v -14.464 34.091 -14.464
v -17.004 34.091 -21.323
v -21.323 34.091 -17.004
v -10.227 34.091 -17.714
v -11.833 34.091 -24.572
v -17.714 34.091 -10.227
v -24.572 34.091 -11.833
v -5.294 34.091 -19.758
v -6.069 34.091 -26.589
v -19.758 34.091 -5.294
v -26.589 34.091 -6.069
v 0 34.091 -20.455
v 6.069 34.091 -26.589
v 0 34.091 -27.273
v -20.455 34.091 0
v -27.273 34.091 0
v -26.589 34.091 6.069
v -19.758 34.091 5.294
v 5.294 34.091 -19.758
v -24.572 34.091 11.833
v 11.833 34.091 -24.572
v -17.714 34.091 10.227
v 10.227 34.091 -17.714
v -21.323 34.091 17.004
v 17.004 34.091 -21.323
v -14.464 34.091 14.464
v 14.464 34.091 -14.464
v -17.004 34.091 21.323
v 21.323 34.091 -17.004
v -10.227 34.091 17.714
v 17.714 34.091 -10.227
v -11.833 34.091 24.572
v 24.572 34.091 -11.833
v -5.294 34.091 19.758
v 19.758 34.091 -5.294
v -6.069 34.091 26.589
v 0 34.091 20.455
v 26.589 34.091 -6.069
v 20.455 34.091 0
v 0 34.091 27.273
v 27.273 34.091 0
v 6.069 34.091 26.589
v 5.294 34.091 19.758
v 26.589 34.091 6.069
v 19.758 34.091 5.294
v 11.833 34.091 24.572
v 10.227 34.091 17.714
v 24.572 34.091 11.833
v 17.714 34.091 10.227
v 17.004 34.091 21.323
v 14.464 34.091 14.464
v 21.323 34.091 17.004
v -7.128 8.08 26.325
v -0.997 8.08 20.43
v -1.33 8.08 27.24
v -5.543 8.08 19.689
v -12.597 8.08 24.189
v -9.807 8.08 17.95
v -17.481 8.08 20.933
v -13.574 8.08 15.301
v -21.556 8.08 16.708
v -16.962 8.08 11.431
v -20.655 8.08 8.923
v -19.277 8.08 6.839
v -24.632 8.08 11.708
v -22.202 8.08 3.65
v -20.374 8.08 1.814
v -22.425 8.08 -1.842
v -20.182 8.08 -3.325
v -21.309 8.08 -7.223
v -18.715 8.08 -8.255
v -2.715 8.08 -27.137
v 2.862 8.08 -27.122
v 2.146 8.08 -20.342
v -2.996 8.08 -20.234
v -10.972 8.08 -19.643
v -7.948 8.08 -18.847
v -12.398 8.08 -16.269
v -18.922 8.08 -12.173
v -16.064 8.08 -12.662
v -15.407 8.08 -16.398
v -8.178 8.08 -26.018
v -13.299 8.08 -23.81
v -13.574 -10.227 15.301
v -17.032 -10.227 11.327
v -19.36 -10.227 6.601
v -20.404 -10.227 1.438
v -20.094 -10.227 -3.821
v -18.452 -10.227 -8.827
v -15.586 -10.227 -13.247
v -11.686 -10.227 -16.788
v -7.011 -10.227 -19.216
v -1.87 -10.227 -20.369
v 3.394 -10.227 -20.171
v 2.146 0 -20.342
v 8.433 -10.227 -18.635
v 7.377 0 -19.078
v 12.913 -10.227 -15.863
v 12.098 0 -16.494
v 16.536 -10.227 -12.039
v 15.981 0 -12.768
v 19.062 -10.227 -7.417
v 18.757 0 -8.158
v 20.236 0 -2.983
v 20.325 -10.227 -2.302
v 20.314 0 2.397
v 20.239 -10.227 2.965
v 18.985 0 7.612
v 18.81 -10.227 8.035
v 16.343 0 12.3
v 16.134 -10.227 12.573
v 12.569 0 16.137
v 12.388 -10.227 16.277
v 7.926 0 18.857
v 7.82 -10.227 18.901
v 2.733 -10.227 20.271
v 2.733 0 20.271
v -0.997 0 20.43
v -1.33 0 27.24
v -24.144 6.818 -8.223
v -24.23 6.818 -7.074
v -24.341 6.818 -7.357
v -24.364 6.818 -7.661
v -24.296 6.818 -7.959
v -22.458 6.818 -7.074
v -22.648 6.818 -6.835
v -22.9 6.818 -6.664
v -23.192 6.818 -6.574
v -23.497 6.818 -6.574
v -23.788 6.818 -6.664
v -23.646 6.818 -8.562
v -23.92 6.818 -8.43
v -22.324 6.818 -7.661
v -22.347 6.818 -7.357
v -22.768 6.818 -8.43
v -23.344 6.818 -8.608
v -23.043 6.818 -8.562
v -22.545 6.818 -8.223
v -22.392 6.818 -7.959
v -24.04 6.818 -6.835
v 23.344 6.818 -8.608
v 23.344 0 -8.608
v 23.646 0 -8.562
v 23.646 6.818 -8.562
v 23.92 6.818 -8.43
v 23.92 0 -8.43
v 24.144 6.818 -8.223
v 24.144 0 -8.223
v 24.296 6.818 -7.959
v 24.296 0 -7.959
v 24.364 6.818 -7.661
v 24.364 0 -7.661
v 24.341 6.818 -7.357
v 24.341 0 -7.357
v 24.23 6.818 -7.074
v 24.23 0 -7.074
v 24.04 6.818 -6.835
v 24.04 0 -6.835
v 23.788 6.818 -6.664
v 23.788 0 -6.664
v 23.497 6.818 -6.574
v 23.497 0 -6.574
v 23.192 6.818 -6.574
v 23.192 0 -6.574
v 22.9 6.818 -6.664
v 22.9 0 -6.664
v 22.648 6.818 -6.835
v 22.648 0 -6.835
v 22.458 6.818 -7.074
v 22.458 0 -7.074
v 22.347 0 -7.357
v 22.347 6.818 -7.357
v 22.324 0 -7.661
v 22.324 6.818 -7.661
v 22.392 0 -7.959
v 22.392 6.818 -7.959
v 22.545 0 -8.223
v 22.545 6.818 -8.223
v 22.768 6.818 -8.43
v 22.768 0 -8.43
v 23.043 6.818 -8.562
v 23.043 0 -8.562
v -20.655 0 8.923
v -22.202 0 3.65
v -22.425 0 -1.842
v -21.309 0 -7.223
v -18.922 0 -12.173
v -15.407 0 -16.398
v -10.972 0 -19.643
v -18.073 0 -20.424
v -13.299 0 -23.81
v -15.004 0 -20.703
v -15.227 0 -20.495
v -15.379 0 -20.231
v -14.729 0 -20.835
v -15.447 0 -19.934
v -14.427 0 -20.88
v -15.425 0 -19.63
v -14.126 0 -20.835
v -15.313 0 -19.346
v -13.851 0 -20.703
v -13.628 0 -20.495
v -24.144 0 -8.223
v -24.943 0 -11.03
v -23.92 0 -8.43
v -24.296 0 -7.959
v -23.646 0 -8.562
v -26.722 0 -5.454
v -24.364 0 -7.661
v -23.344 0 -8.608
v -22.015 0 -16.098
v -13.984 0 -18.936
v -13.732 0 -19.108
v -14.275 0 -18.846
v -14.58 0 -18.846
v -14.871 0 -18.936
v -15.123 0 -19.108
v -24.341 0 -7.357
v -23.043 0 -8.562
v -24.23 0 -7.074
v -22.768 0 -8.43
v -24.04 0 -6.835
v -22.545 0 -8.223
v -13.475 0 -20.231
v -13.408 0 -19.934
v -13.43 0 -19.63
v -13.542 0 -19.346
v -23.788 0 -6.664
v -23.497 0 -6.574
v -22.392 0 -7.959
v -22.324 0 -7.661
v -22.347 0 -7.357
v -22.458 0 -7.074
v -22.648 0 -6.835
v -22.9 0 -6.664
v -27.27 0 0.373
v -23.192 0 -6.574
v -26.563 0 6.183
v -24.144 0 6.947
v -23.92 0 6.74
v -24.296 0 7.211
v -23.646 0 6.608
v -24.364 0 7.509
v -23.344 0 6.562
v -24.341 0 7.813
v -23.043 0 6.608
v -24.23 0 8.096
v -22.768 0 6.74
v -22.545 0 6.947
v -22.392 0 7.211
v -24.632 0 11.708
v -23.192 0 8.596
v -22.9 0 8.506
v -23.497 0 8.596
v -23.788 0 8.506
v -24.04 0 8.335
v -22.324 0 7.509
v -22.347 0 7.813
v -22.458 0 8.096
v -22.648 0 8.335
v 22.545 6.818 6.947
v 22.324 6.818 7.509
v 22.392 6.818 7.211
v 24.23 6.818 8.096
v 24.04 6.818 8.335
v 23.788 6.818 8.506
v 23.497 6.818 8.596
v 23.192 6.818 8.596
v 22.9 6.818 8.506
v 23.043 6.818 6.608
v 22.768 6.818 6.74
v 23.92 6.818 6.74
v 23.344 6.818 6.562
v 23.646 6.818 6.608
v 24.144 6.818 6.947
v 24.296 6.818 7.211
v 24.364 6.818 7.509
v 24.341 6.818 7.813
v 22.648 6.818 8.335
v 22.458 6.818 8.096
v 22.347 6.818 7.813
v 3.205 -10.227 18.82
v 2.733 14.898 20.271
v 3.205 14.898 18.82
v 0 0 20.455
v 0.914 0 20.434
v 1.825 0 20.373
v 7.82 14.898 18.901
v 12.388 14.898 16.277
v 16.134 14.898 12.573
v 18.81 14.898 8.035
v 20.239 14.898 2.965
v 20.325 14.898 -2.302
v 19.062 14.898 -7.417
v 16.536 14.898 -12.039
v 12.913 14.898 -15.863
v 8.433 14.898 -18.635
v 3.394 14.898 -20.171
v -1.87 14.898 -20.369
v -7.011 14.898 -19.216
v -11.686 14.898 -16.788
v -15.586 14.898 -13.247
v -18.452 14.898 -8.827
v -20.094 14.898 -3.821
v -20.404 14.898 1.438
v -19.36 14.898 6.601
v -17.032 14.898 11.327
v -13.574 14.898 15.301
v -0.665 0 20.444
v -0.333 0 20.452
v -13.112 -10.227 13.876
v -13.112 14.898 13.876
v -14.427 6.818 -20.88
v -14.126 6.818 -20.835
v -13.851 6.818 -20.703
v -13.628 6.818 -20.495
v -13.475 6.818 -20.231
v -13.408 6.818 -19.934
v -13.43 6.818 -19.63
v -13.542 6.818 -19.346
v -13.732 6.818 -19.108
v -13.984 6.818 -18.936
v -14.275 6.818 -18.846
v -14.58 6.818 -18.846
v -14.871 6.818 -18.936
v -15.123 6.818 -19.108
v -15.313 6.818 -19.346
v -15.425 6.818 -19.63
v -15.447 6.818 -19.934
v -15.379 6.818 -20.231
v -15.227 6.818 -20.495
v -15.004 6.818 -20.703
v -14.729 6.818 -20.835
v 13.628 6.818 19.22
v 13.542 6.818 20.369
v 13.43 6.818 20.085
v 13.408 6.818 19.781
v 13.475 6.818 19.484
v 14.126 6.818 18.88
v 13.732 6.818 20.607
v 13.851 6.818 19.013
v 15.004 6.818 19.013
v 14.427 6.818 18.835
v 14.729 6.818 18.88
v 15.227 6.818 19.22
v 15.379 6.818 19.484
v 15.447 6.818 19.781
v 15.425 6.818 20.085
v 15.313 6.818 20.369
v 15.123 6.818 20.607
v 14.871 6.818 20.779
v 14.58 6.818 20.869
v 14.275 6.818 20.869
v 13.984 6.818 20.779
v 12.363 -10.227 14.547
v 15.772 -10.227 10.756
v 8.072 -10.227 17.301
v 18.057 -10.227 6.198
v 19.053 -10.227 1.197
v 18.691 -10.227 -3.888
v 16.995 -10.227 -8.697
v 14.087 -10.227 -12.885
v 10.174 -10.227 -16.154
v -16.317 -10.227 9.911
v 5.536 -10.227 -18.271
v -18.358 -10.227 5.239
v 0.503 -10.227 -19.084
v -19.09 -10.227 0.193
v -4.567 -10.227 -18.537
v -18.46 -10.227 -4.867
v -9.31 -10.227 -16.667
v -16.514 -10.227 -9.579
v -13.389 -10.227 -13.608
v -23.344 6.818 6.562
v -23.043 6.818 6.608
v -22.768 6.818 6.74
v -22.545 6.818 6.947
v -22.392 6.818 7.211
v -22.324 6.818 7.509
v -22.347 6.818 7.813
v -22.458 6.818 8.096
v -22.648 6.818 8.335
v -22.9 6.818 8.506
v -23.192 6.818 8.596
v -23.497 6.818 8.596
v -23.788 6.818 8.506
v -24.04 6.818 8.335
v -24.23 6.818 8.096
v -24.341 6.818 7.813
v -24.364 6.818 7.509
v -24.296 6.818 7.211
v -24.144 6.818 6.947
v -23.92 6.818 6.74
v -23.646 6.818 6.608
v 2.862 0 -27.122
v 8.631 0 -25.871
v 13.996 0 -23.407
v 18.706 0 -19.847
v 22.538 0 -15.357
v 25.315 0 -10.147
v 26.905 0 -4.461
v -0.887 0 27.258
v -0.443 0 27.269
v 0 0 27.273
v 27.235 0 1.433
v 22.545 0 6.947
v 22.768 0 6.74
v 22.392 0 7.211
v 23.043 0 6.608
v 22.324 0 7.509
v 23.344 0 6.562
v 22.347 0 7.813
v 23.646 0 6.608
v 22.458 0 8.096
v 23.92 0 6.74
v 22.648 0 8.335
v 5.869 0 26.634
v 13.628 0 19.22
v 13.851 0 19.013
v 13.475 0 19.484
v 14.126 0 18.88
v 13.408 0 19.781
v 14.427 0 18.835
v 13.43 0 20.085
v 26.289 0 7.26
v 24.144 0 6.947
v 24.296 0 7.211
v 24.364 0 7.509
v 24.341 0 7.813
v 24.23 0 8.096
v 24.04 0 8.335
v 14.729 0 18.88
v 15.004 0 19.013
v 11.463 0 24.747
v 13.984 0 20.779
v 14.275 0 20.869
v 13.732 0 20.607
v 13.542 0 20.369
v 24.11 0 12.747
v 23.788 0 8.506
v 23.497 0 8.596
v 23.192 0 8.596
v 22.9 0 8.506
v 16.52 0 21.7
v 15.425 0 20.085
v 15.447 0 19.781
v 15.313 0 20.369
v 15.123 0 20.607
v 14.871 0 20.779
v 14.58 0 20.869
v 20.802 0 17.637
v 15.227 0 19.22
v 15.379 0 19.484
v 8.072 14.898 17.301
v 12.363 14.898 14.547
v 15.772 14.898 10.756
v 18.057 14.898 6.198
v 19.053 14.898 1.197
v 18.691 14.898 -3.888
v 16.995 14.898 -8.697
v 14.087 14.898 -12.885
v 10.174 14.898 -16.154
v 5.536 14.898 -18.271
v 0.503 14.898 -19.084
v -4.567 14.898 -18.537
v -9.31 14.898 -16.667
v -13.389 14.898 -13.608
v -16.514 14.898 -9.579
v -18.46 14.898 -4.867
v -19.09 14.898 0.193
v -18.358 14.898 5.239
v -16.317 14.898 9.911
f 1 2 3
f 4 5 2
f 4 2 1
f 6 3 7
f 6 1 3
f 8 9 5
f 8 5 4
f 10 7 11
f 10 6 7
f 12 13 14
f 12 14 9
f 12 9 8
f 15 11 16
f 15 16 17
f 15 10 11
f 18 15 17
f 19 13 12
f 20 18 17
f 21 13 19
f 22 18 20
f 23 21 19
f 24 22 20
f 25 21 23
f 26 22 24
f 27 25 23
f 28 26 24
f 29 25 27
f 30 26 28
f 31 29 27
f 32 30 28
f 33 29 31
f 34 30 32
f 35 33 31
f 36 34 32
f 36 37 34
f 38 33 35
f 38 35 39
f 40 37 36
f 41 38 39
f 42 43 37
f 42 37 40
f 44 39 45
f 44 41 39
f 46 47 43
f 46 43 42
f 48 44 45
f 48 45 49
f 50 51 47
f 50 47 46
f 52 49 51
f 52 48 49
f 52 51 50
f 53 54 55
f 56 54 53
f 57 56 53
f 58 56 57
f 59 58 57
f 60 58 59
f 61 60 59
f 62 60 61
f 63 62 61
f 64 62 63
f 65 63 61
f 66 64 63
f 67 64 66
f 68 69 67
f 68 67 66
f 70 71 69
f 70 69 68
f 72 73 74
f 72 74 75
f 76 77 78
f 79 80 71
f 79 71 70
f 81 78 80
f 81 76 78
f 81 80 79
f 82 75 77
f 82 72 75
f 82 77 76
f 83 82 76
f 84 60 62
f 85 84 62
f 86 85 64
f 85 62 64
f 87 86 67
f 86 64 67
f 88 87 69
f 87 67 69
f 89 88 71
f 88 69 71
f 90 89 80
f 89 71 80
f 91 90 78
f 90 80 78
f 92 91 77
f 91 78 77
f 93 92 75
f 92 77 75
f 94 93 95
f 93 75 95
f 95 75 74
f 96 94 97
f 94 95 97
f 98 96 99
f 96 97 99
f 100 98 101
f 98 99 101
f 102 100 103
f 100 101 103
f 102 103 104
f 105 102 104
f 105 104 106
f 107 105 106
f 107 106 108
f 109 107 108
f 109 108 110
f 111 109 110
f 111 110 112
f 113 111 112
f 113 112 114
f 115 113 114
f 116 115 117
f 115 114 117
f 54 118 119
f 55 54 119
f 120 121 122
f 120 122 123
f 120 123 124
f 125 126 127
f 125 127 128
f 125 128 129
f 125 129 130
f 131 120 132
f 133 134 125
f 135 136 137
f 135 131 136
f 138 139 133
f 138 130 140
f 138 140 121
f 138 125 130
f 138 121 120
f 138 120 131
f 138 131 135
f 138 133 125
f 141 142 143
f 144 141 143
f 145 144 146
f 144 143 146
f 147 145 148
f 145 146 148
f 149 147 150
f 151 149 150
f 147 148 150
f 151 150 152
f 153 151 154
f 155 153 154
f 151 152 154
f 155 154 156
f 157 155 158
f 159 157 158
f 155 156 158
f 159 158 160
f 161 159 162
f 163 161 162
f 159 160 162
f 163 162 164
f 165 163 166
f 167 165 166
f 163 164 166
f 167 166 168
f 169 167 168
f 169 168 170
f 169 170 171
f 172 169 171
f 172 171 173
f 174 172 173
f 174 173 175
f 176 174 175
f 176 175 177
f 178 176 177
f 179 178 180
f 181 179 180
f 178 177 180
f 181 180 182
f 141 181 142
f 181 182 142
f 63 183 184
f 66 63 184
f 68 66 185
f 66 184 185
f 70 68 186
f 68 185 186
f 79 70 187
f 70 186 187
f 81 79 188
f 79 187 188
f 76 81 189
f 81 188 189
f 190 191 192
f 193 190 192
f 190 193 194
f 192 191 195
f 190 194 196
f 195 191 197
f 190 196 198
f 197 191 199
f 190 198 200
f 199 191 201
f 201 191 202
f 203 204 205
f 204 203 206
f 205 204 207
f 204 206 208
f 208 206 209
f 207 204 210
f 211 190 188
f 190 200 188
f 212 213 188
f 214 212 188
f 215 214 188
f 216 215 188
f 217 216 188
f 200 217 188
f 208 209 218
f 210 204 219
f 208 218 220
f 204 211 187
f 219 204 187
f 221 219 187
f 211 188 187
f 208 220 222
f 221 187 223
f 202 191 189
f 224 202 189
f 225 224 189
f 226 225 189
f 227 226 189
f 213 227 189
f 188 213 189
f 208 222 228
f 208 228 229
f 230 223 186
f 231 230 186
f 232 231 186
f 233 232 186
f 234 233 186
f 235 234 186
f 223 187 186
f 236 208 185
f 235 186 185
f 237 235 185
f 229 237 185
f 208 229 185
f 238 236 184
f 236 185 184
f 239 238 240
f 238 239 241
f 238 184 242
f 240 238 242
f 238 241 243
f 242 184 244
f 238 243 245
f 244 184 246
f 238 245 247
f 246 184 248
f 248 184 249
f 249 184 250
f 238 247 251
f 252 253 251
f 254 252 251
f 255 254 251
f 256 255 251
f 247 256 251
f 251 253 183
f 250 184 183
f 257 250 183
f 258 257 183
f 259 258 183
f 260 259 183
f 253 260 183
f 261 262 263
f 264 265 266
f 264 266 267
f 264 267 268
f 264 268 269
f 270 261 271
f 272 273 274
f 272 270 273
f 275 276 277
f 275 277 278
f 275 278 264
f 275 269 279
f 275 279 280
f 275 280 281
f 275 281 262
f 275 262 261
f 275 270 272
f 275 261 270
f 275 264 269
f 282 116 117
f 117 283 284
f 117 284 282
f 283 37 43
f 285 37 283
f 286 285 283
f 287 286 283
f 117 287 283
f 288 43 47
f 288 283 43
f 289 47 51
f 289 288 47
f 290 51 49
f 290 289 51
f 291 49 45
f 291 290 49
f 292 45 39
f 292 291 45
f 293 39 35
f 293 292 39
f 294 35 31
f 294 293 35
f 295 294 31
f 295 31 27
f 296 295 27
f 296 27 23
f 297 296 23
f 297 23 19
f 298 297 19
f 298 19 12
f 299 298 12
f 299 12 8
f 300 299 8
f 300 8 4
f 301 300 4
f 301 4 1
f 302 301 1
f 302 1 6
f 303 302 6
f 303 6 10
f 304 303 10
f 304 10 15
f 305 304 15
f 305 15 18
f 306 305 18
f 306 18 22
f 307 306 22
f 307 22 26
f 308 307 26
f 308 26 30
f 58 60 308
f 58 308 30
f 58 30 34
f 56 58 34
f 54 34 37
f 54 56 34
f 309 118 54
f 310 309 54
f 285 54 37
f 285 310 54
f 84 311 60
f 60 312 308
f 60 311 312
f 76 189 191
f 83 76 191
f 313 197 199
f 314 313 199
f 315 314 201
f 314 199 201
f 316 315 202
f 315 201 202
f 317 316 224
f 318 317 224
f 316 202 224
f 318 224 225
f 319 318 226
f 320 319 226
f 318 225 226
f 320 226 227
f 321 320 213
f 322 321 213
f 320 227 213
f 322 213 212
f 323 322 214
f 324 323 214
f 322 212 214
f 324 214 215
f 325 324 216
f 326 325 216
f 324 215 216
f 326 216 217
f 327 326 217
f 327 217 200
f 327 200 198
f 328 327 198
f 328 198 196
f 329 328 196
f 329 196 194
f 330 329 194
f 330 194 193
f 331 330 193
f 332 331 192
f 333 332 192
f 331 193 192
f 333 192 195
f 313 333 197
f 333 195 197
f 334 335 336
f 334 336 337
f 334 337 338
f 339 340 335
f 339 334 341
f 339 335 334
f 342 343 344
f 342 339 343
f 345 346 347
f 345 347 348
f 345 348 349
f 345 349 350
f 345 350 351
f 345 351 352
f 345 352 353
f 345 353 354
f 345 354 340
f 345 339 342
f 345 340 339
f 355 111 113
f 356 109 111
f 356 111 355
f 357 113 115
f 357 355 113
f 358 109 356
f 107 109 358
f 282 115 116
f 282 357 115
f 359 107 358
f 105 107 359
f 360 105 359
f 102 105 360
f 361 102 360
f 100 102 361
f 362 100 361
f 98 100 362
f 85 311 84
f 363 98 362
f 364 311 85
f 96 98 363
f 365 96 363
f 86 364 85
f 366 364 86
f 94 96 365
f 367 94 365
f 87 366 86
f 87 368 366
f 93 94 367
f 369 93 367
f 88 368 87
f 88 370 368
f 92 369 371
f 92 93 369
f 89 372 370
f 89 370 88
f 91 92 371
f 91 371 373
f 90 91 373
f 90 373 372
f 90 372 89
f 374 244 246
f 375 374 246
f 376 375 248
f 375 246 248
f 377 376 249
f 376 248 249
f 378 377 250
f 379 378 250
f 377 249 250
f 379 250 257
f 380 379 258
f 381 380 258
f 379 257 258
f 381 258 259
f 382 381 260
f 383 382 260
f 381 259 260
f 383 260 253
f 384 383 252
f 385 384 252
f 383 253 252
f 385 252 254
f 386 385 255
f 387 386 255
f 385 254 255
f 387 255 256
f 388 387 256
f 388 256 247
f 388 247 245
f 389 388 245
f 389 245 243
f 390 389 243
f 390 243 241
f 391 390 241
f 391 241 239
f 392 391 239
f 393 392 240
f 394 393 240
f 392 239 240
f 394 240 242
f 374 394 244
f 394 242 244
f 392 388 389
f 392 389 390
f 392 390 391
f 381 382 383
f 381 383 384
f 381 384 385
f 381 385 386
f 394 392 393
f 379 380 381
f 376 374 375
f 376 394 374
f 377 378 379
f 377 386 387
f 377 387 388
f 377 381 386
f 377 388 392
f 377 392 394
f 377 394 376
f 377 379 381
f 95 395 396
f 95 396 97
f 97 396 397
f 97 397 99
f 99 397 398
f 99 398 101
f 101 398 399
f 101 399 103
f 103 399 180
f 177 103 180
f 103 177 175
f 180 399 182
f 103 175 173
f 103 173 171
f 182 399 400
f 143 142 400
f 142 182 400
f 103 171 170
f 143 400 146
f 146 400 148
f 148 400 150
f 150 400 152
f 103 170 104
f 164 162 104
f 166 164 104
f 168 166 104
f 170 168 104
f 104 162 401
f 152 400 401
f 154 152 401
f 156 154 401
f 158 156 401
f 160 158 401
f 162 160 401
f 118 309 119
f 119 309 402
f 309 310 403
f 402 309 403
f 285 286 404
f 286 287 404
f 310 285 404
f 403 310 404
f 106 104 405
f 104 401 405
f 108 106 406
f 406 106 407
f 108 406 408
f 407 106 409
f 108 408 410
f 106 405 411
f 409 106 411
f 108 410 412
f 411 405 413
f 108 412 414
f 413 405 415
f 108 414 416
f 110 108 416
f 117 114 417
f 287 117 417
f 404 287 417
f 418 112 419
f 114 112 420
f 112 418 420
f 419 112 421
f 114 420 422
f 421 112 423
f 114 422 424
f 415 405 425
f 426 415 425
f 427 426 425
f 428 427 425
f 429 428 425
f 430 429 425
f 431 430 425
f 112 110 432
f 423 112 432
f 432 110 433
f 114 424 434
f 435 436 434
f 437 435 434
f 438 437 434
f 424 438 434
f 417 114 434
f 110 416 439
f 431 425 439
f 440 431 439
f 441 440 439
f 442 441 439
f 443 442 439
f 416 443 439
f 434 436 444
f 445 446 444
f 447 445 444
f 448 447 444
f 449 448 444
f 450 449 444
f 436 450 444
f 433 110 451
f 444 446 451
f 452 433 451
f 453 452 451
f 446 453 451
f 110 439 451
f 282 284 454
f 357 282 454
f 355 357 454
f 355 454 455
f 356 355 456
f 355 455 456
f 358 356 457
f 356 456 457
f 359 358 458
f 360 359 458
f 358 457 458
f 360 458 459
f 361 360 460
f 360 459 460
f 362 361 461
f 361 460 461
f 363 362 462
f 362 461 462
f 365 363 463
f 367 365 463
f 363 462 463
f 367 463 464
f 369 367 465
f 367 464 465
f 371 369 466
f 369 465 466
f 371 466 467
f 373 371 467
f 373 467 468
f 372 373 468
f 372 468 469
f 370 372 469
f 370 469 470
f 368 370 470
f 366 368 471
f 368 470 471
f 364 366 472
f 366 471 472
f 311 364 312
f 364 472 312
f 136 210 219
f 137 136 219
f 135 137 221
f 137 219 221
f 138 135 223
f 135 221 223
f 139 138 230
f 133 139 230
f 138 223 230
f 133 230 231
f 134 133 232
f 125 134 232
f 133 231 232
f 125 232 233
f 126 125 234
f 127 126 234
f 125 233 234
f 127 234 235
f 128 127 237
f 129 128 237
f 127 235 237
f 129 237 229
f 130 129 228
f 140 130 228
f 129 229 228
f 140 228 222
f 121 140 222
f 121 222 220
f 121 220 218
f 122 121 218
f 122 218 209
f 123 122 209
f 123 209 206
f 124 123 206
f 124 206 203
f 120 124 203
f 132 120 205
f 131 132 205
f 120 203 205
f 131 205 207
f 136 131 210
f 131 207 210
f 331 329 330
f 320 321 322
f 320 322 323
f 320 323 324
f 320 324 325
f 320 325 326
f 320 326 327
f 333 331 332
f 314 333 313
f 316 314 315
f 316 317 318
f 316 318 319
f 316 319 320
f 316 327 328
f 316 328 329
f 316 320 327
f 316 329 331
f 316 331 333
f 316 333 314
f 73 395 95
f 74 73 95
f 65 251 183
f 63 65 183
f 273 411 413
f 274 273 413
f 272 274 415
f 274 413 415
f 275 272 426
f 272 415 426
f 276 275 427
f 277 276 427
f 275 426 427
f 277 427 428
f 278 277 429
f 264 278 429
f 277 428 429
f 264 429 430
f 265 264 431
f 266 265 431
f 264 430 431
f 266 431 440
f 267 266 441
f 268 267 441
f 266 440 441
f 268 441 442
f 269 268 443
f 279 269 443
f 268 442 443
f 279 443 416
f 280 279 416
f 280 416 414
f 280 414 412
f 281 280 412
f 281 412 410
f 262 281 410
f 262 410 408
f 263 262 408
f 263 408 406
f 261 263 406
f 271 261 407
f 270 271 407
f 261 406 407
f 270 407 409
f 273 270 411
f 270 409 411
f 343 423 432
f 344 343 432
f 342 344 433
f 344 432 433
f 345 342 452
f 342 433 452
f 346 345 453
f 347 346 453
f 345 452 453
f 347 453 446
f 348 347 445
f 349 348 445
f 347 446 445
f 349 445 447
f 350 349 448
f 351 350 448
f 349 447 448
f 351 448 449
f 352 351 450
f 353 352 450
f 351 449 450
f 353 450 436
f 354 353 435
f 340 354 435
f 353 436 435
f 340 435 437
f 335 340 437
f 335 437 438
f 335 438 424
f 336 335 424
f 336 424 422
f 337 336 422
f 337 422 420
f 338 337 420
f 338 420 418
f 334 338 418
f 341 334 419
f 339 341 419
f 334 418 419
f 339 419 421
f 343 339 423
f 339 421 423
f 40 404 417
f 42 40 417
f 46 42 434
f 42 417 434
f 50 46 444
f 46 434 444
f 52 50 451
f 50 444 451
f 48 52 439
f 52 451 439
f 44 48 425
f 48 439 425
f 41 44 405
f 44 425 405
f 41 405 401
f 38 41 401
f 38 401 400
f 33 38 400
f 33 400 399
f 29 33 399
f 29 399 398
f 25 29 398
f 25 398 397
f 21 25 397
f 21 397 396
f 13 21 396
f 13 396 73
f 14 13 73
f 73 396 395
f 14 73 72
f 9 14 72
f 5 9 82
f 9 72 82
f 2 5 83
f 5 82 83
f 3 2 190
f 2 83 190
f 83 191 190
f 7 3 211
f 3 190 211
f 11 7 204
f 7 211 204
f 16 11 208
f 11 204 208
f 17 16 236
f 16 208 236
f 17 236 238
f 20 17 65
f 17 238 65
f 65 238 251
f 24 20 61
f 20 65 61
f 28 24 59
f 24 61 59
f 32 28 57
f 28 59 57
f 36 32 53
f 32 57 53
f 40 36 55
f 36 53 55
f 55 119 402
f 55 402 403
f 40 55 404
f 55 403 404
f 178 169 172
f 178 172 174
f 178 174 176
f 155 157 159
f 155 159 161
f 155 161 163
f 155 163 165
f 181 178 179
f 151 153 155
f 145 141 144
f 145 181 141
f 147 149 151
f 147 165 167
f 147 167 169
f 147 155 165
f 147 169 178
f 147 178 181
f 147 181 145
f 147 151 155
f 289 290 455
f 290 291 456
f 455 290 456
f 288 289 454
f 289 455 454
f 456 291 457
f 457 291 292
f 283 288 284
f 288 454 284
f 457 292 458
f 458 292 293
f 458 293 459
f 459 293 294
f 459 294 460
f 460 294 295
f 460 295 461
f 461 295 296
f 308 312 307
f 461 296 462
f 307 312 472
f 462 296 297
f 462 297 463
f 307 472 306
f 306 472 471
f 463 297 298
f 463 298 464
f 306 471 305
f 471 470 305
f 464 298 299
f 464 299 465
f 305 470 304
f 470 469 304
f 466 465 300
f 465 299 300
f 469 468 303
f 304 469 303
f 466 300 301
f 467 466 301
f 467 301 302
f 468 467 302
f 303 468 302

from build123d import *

# Parameters (mm, degrees)
ESBO_O1_R                     = 40
ESBO_O1_R_2                   = 30
RESSALTO_EXTRUS_O1_DEPTH      = 50
ESBO_O2_R                     = 1.5
CORTE_EXTRUS_O1_DEPTH         = 10
CORTE_EXTRUS_O2_DEPTH         = 11.84997677
RESSALTO_EXTRUS_O2_DEPTH      = 26.84997677
RESSALTO_EXTRUS_O2_DEPTH_BACK = 10
ESCALA1_SCALE                 = 0.681818182


with BuildPart() as part:
    # Esboço1 → Ressalto-extrusão1 (new body)
    with BuildSketch(Plane(origin=(0, 0, 0), x_dir=(1, 0, 0), z_dir=(0, 1, 0))):
        with Locations(Location((0, 0, 0), (0, 0, 270))):
            Circle(ESBO_O1_R)
        with Locations(Location((0, 0, 0), (0, 0, 270))):
            Circle(ESBO_O1_R_2, mode=Mode.SUBTRACT)
    extrude(amount=RESSALTO_EXTRUS_O1_DEPTH)

    # Esboço2 → Corte-extrusão1 (cut)
    with BuildSketch(Plane(origin=(0, 0, 0), x_dir=(-1, 0, 0), z_dir=(0, -1, 0))):
        with Locations(Location((-21.160269083, -29.124611797, 0), (0, 0, 90))):
            Circle(ESBO_O2_R)
        with Locations(Location((-34.238034587, -11.124611797, 0), (0, 0, 90))):
            Circle(ESBO_O2_R)
        with Locations(Location((-34.238034587, 11.124611797, 0), (0, 0, 90))):
            Circle(ESBO_O2_R)
        with Locations(Location((21.160269083, 29.124611797, 0), (0, 0, 90))):
            Circle(ESBO_O2_R)
        with Locations(Location((34.238034587, 11.124611797, 0), (0, 0, 90))):
            Circle(ESBO_O2_R)
        with Locations(Location((34.238034587, -11.124611797, 0), (0, 0, 90))):
            Circle(ESBO_O2_R)
    extrude(amount=-CORTE_EXTRUS_O1_DEPTH, mode=Mode.SUBTRACT)

    # Esboço3 → Corte-extrusão2 (cut)
    with BuildSketch(Plane(origin=(0, 0, 0), x_dir=(-1, 0, 0), z_dir=(0, -1, 0))):
        with BuildLine():
            ThreePointArc((30.293924668, -13.087327008), (31.253408489, 10.593604572), (16.092357529, 28.81034587))
            Line((16.092357529, 28.81034587), (19.505887914, 34.921631358))
            ThreePointArc((19.505887914, 34.921631358), (8.030354378, 39.185627576), (-4.197370073, 39.779166463))
            Line((-4.197370073, 39.779166463), (-3.148027555, 29.834374847))
            ThreePointArc((-3.148027555, 29.834374847), (29.911212101, 2.306380417), (1.462902849, -29.964310692))
            Line((1.462902849, -29.964310692), (1.950537132, -39.952414256))
            ThreePointArc((1.950537132, -39.952414256), (22.185986252, -33.283359416), (36.126859334, -17.171197823))
            Line((36.126859334, -17.171197823), (30.293924668, -13.087327008))
        make_face()
    extrude(amount=-CORTE_EXTRUS_O2_DEPTH, mode=Mode.SUBTRACT)

    # Esboço4 → Ressalto-extrusão2 (add, two sides: drawn at the far end of the back side and taken through both)
    with BuildSketch(Plane(origin=(0, 11.84997677, 0), x_dir=(-1, 0, 0), z_dir=(0, -1, 0)).offset(-RESSALTO_EXTRUS_O2_DEPTH_BACK)):
        with BuildLine():
            Line((-4.008838629, -29.730947056), (-4.700362463, -27.602655537))
            ThreePointArc((-4.700362463, -27.602655537), (-8.119302432, 26.79695744), (19.230258499, -20.351834268))
            Line((19.230258499, -20.351834268), (19.909240802, -22.441526924))
            ThreePointArc((19.909240802, -22.441526924), (-8.745833796, 28.696870757), (-4.008838629, -29.730947056))
        make_face()
    extrude(amount=RESSALTO_EXTRUS_O2_DEPTH + RESSALTO_EXTRUS_O2_DEPTH_BACK)


with BuildPart() as part_1:
    # Escala1: scaled about (0, 0, 0)
    add(part.part.scale(ESCALA1_SCALE))


solid = part_1.part
